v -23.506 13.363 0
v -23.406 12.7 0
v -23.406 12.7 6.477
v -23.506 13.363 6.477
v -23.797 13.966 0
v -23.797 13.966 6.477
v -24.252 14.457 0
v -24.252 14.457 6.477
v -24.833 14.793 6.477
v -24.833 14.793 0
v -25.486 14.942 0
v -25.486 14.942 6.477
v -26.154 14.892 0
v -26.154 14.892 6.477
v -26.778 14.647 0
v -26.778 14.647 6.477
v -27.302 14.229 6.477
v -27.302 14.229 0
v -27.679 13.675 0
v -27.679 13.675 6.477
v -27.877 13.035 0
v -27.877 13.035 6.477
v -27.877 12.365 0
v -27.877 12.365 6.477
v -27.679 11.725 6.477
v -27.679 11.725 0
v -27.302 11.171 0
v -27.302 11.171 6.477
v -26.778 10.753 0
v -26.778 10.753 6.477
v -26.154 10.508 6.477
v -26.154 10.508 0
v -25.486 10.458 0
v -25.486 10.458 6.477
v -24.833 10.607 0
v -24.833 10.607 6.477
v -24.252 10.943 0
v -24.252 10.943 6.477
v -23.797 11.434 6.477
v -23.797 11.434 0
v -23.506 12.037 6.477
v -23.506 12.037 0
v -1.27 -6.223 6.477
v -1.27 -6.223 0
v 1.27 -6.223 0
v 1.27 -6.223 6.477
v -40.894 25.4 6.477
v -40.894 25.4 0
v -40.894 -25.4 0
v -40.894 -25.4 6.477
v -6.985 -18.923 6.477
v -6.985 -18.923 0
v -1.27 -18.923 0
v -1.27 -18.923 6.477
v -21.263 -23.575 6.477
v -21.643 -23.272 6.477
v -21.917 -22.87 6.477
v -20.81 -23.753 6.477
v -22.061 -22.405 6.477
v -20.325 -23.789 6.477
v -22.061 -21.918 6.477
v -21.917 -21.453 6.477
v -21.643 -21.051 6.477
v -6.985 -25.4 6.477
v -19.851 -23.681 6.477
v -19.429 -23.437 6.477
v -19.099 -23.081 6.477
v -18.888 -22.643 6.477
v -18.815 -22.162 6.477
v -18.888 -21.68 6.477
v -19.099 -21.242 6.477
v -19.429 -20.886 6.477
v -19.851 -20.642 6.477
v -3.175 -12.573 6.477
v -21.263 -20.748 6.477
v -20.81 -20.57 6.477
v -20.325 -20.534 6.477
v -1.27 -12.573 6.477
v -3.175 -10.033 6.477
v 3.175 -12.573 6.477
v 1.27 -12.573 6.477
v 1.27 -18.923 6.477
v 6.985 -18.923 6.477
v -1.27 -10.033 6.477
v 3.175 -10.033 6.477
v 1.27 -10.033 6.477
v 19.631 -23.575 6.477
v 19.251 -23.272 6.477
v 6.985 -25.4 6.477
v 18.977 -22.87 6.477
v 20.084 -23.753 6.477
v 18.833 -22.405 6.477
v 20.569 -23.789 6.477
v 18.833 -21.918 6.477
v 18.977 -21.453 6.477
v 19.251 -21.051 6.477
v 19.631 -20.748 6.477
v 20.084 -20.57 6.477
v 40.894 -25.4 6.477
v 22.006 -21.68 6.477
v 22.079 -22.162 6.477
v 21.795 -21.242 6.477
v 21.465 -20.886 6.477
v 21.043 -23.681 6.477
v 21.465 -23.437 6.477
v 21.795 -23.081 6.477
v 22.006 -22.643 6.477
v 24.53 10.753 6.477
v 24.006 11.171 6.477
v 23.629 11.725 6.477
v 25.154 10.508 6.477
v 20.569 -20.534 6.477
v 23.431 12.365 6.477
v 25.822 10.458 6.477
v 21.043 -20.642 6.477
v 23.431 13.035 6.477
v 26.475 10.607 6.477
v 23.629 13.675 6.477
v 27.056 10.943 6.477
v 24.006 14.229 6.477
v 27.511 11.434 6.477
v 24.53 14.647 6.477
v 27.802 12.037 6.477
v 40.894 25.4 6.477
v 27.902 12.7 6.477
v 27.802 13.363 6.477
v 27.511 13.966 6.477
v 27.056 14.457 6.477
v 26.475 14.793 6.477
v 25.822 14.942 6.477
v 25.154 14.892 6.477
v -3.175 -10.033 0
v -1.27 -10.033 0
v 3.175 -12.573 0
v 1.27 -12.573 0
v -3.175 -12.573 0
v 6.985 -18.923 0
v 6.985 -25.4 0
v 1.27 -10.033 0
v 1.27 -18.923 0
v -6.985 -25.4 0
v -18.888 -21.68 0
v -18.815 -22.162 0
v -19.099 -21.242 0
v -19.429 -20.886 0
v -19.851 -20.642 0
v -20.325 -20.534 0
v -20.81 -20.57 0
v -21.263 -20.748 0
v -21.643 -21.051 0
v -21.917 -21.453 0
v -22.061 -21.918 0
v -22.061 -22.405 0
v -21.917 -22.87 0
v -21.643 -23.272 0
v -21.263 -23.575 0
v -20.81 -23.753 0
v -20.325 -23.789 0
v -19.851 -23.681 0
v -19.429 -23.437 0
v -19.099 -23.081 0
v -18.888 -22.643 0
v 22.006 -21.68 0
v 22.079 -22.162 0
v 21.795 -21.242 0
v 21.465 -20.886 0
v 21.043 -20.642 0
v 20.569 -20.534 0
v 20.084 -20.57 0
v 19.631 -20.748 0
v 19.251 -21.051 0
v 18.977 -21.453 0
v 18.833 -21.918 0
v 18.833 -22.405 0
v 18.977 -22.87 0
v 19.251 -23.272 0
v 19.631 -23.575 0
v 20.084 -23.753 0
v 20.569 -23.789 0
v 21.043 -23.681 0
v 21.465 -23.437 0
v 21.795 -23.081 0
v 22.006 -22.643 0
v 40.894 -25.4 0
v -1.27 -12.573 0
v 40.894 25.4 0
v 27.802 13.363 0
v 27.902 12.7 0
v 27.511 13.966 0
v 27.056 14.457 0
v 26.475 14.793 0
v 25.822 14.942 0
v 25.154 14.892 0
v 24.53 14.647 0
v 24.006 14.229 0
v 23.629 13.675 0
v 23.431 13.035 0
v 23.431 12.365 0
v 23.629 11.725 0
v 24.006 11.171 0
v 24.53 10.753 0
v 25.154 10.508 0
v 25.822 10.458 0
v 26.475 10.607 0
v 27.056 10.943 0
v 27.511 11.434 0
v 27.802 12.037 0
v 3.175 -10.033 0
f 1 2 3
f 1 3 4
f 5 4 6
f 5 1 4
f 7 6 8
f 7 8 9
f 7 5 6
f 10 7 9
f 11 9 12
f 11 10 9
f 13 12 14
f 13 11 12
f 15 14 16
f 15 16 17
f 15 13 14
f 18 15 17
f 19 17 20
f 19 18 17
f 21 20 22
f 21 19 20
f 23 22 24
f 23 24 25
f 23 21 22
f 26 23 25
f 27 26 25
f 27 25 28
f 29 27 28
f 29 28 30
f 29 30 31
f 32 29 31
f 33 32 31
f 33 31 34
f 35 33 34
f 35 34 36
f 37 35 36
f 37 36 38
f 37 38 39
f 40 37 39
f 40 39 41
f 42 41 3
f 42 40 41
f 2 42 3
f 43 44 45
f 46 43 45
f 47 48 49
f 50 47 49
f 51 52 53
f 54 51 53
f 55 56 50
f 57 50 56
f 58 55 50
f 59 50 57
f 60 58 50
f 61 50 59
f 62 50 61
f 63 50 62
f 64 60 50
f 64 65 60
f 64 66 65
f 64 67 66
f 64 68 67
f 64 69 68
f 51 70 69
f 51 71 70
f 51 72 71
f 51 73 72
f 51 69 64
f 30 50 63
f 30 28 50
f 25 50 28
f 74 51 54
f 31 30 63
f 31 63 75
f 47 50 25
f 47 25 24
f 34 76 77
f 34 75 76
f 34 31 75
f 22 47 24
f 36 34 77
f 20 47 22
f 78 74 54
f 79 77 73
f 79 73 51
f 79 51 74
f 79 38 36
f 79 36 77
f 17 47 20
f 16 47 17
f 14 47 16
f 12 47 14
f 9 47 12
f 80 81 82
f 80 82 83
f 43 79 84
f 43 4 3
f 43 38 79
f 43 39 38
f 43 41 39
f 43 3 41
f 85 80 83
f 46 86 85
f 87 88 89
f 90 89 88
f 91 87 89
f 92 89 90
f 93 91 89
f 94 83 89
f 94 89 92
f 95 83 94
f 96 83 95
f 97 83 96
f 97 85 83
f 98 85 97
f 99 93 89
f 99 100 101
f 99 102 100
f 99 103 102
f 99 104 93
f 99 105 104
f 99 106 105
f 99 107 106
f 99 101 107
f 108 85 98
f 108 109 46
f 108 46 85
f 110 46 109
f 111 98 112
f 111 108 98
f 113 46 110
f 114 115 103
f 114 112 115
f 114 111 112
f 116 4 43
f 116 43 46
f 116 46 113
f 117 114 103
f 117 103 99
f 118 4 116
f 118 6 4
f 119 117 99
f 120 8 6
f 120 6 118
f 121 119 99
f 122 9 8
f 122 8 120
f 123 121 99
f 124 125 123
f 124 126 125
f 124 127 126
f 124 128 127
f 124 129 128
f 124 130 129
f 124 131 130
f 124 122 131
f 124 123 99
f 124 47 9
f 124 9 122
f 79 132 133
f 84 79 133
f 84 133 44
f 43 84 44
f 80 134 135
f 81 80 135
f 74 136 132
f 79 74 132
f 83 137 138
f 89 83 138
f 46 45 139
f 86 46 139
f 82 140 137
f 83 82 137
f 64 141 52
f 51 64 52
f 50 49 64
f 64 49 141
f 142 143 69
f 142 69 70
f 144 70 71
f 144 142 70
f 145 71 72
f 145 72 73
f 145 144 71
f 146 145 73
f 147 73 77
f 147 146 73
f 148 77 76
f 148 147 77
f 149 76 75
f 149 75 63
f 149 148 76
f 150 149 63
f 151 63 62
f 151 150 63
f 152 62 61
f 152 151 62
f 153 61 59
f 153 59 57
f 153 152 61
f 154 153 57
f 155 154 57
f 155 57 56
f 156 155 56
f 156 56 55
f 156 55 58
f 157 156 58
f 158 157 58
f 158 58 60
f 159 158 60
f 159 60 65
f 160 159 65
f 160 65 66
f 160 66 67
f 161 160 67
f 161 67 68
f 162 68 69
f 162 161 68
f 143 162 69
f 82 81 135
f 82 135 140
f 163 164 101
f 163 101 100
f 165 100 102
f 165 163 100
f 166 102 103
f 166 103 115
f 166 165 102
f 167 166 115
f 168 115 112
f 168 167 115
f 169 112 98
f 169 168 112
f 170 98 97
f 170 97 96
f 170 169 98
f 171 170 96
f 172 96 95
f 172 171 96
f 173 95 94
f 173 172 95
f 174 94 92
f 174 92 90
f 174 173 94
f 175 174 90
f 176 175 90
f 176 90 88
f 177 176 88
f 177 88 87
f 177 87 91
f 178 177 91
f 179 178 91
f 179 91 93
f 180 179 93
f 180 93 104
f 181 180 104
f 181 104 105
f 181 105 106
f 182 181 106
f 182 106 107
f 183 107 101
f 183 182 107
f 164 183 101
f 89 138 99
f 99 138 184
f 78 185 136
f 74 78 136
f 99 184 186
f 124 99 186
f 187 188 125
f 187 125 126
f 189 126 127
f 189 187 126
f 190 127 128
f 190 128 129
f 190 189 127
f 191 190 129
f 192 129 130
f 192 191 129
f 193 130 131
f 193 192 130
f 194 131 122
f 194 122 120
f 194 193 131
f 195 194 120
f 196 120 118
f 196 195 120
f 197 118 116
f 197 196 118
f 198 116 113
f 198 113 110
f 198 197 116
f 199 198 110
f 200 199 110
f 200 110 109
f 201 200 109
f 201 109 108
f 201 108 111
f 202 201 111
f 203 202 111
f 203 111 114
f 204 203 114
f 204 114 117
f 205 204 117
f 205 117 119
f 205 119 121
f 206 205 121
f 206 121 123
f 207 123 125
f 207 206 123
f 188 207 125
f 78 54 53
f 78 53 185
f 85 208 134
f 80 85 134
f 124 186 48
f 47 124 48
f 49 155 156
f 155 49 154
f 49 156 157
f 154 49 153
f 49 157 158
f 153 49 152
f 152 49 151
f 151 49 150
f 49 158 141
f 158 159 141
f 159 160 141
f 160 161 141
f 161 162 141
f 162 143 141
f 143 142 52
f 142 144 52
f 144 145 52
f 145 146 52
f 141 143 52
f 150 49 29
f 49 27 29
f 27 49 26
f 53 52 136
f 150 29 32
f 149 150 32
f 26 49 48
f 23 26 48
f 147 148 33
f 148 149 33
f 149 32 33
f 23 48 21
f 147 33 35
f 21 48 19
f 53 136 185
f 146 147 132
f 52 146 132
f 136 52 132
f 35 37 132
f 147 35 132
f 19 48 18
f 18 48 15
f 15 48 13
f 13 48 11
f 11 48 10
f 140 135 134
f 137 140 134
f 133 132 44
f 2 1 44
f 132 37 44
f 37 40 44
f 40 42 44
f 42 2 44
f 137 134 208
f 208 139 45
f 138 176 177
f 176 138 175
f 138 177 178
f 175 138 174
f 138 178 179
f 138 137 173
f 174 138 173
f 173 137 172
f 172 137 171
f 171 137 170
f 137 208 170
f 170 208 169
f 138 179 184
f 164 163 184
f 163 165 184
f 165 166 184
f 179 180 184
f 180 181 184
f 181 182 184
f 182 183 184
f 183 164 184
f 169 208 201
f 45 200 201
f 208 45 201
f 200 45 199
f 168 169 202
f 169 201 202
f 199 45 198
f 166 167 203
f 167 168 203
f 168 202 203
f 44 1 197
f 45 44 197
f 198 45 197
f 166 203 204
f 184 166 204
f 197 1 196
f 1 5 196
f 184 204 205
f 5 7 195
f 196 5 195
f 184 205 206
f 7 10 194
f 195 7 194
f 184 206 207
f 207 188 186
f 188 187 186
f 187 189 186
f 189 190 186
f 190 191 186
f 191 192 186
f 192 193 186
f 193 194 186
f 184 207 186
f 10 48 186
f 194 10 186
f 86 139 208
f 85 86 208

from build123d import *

# Parameters (mm, degrees)
SKETCH1_R           = 1.63195
SKETCH1_R_2         = 2.2479
BOSS_EXTRUDE1_DEPTH = 6.477


with BuildPart() as part:
    # Sketch1 → Boss-Extrude1 (new body)
    with BuildSketch(Plane.XY):
        Polygon((-6.985, -18.923), (-1.27, -18.923), (-1.27, -12.573), (-3.175, -12.573), (-3.175, -10.033), (-1.27, -10.033), (-1.27, -6.223), (1.27, -6.223), (1.27, -10.033), (3.175, -10.033), (3.175, -12.573), (1.27, -12.573), (1.27, -18.923), (6.985, -18.923), (6.985, -25.4), (40.894, -25.4), (40.894, 25.4), (-40.894, 25.4), (-40.894, -25.4), (-6.985, -25.4), align=None)
        with Locations((-20.447, -22.1615)):
            Circle(SKETCH1_R, mode=Mode.SUBTRACT)
        with Locations((20.447, -22.1615)):
            Circle(SKETCH1_R, mode=Mode.SUBTRACT)
        with Locations((-25.654, 12.7)):
            Circle(SKETCH1_R_2, mode=Mode.SUBTRACT)
        with Locations((25.654, 12.7)):
            Circle(SKETCH1_R_2, mode=Mode.SUBTRACT)
    extrude(amount=BOSS_EXTRUDE1_DEPTH)


solid = part.part
